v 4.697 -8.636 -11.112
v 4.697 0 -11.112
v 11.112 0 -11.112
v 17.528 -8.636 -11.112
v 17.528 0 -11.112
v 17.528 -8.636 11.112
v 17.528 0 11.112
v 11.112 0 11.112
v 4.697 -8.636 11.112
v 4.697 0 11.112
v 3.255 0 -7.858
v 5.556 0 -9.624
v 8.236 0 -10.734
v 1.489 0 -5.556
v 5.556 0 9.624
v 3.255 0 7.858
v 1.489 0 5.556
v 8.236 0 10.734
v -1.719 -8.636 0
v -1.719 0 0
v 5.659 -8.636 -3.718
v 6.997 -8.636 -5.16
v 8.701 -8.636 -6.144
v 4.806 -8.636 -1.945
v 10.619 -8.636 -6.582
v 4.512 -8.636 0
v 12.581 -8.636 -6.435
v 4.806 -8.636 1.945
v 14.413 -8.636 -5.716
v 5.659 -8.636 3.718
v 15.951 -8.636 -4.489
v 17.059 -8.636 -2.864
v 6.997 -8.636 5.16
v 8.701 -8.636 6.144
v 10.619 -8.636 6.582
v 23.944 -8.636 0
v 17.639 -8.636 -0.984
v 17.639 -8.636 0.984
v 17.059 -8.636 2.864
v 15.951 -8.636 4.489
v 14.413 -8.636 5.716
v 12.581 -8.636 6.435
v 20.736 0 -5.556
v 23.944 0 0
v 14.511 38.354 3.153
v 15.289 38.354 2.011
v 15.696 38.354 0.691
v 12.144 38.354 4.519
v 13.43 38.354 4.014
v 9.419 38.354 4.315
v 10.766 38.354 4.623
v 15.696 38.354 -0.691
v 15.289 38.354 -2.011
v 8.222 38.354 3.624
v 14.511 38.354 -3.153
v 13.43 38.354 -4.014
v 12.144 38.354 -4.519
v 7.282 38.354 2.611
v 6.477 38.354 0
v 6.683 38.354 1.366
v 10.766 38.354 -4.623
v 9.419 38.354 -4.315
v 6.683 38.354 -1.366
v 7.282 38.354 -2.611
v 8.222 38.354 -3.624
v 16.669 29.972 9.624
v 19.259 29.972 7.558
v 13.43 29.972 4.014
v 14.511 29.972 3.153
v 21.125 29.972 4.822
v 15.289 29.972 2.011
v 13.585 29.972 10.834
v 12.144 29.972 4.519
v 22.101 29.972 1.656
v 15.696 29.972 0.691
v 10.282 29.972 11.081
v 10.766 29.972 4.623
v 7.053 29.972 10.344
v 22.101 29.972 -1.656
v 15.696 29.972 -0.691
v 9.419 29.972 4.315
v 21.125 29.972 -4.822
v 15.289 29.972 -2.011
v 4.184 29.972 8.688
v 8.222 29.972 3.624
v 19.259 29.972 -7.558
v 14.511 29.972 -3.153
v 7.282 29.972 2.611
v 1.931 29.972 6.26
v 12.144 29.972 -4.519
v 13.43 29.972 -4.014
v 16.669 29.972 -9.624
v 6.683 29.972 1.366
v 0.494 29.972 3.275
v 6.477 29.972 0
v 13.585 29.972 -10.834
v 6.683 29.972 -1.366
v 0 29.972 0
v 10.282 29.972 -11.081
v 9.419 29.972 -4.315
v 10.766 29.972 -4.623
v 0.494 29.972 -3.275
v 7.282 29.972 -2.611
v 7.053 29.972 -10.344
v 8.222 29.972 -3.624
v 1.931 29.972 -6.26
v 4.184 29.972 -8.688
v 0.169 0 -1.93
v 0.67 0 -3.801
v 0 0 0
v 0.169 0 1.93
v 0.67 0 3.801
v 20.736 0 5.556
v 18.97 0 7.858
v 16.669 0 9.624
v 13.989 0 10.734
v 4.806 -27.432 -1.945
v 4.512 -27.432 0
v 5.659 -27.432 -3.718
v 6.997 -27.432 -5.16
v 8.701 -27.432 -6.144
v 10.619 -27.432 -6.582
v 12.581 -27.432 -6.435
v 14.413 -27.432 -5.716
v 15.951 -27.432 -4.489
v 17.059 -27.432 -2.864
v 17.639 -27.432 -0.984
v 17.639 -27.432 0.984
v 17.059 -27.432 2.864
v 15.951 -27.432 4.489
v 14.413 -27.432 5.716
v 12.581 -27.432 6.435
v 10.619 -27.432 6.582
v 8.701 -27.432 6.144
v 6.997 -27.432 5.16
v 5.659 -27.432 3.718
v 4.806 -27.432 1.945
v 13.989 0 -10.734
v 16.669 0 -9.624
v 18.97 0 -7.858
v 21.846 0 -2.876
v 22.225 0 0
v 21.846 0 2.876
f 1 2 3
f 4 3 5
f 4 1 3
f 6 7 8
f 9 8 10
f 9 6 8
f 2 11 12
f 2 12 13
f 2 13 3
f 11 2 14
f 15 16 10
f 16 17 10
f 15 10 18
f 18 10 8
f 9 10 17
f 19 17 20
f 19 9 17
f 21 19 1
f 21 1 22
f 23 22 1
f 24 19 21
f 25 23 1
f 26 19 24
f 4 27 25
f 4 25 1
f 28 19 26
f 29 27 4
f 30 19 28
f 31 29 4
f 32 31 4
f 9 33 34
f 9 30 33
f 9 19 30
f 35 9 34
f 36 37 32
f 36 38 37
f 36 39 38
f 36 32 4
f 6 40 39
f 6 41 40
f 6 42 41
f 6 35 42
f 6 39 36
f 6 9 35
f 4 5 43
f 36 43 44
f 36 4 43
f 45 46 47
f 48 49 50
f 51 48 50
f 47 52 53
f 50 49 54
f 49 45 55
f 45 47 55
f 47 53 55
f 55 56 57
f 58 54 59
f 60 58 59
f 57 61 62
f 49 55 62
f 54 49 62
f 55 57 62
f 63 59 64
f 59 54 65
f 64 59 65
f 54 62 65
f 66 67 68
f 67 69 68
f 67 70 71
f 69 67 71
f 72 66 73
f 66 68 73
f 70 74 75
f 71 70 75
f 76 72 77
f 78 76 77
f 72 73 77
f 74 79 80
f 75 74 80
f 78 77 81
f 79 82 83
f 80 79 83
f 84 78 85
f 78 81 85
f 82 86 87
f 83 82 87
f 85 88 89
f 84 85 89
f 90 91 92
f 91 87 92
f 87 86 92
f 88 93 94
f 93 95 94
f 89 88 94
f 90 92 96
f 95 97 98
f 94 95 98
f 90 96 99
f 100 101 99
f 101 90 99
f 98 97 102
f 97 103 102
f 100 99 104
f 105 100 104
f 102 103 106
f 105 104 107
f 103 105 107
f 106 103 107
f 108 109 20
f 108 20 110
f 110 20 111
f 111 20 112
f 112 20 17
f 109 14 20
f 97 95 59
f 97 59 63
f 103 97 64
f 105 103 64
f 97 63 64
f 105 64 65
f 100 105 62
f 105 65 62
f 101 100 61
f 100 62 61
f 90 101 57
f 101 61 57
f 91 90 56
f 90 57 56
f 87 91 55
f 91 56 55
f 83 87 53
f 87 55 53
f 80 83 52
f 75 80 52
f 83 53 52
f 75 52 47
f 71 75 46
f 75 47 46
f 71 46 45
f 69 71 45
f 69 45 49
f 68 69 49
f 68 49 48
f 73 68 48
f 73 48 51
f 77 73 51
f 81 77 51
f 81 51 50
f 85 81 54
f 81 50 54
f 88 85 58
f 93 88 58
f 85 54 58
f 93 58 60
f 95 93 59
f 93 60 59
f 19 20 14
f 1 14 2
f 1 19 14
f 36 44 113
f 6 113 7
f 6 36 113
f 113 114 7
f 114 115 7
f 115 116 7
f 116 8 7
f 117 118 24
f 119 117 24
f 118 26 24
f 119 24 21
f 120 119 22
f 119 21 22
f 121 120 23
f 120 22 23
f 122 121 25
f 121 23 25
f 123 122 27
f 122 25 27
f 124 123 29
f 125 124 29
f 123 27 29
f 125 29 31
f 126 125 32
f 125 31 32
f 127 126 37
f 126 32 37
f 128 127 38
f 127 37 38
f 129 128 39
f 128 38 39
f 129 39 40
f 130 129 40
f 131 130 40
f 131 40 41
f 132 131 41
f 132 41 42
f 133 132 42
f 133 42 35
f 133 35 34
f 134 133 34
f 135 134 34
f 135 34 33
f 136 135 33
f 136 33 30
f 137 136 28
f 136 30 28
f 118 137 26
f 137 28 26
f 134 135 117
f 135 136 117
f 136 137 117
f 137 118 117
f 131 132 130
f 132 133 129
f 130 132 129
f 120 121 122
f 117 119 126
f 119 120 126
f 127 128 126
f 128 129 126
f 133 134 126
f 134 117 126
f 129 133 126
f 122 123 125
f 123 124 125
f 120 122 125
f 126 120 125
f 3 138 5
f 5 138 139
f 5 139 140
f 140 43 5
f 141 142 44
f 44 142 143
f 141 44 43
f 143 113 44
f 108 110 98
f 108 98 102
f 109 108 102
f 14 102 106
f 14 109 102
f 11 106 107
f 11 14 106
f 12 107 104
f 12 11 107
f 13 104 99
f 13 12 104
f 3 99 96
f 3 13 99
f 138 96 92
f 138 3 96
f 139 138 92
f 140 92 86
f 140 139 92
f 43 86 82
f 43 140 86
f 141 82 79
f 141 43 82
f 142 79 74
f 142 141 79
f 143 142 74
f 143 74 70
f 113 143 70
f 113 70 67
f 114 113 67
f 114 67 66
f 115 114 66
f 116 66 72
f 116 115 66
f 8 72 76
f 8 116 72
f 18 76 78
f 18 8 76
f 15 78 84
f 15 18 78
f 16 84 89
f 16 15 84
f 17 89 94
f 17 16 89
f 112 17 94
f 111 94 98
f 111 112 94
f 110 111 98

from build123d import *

# Parameters (mm, degrees)
BOSS_EXTRUDE1_DEPTH = 8.636


with BuildPart() as part:
    # Sketch1 → Revolve1 (revolve)
    with BuildSketch(Plane.XY):
        Polygon((0, 0), (0, 29.972), (6.477, 29.972), (6.477, 38.354), (11.1125, 38.354), (11.1125, 0), (11.1125, -27.432), (4.5125, -27.432), (4.5125, -8.636), (0, -8.636), align=None)
    revolve(axis=Axis((11.1125, 38.354, 0), (0, -1, 0)))

    # Sketch2 → Boss-Extrude1 (add)
    with BuildSketch(Plane.XZ.offset(8.636)):
        Polygon((23.944109733, 0), (17.528304866, 11.1125), (4.696695134, 11.1125), (-1.719109733, 0), (4.696695134, -11.1125), (17.528304866, -11.1125), align=None)
    extrude(amount=-BOSS_EXTRUDE1_DEPTH)


solid = part.part
